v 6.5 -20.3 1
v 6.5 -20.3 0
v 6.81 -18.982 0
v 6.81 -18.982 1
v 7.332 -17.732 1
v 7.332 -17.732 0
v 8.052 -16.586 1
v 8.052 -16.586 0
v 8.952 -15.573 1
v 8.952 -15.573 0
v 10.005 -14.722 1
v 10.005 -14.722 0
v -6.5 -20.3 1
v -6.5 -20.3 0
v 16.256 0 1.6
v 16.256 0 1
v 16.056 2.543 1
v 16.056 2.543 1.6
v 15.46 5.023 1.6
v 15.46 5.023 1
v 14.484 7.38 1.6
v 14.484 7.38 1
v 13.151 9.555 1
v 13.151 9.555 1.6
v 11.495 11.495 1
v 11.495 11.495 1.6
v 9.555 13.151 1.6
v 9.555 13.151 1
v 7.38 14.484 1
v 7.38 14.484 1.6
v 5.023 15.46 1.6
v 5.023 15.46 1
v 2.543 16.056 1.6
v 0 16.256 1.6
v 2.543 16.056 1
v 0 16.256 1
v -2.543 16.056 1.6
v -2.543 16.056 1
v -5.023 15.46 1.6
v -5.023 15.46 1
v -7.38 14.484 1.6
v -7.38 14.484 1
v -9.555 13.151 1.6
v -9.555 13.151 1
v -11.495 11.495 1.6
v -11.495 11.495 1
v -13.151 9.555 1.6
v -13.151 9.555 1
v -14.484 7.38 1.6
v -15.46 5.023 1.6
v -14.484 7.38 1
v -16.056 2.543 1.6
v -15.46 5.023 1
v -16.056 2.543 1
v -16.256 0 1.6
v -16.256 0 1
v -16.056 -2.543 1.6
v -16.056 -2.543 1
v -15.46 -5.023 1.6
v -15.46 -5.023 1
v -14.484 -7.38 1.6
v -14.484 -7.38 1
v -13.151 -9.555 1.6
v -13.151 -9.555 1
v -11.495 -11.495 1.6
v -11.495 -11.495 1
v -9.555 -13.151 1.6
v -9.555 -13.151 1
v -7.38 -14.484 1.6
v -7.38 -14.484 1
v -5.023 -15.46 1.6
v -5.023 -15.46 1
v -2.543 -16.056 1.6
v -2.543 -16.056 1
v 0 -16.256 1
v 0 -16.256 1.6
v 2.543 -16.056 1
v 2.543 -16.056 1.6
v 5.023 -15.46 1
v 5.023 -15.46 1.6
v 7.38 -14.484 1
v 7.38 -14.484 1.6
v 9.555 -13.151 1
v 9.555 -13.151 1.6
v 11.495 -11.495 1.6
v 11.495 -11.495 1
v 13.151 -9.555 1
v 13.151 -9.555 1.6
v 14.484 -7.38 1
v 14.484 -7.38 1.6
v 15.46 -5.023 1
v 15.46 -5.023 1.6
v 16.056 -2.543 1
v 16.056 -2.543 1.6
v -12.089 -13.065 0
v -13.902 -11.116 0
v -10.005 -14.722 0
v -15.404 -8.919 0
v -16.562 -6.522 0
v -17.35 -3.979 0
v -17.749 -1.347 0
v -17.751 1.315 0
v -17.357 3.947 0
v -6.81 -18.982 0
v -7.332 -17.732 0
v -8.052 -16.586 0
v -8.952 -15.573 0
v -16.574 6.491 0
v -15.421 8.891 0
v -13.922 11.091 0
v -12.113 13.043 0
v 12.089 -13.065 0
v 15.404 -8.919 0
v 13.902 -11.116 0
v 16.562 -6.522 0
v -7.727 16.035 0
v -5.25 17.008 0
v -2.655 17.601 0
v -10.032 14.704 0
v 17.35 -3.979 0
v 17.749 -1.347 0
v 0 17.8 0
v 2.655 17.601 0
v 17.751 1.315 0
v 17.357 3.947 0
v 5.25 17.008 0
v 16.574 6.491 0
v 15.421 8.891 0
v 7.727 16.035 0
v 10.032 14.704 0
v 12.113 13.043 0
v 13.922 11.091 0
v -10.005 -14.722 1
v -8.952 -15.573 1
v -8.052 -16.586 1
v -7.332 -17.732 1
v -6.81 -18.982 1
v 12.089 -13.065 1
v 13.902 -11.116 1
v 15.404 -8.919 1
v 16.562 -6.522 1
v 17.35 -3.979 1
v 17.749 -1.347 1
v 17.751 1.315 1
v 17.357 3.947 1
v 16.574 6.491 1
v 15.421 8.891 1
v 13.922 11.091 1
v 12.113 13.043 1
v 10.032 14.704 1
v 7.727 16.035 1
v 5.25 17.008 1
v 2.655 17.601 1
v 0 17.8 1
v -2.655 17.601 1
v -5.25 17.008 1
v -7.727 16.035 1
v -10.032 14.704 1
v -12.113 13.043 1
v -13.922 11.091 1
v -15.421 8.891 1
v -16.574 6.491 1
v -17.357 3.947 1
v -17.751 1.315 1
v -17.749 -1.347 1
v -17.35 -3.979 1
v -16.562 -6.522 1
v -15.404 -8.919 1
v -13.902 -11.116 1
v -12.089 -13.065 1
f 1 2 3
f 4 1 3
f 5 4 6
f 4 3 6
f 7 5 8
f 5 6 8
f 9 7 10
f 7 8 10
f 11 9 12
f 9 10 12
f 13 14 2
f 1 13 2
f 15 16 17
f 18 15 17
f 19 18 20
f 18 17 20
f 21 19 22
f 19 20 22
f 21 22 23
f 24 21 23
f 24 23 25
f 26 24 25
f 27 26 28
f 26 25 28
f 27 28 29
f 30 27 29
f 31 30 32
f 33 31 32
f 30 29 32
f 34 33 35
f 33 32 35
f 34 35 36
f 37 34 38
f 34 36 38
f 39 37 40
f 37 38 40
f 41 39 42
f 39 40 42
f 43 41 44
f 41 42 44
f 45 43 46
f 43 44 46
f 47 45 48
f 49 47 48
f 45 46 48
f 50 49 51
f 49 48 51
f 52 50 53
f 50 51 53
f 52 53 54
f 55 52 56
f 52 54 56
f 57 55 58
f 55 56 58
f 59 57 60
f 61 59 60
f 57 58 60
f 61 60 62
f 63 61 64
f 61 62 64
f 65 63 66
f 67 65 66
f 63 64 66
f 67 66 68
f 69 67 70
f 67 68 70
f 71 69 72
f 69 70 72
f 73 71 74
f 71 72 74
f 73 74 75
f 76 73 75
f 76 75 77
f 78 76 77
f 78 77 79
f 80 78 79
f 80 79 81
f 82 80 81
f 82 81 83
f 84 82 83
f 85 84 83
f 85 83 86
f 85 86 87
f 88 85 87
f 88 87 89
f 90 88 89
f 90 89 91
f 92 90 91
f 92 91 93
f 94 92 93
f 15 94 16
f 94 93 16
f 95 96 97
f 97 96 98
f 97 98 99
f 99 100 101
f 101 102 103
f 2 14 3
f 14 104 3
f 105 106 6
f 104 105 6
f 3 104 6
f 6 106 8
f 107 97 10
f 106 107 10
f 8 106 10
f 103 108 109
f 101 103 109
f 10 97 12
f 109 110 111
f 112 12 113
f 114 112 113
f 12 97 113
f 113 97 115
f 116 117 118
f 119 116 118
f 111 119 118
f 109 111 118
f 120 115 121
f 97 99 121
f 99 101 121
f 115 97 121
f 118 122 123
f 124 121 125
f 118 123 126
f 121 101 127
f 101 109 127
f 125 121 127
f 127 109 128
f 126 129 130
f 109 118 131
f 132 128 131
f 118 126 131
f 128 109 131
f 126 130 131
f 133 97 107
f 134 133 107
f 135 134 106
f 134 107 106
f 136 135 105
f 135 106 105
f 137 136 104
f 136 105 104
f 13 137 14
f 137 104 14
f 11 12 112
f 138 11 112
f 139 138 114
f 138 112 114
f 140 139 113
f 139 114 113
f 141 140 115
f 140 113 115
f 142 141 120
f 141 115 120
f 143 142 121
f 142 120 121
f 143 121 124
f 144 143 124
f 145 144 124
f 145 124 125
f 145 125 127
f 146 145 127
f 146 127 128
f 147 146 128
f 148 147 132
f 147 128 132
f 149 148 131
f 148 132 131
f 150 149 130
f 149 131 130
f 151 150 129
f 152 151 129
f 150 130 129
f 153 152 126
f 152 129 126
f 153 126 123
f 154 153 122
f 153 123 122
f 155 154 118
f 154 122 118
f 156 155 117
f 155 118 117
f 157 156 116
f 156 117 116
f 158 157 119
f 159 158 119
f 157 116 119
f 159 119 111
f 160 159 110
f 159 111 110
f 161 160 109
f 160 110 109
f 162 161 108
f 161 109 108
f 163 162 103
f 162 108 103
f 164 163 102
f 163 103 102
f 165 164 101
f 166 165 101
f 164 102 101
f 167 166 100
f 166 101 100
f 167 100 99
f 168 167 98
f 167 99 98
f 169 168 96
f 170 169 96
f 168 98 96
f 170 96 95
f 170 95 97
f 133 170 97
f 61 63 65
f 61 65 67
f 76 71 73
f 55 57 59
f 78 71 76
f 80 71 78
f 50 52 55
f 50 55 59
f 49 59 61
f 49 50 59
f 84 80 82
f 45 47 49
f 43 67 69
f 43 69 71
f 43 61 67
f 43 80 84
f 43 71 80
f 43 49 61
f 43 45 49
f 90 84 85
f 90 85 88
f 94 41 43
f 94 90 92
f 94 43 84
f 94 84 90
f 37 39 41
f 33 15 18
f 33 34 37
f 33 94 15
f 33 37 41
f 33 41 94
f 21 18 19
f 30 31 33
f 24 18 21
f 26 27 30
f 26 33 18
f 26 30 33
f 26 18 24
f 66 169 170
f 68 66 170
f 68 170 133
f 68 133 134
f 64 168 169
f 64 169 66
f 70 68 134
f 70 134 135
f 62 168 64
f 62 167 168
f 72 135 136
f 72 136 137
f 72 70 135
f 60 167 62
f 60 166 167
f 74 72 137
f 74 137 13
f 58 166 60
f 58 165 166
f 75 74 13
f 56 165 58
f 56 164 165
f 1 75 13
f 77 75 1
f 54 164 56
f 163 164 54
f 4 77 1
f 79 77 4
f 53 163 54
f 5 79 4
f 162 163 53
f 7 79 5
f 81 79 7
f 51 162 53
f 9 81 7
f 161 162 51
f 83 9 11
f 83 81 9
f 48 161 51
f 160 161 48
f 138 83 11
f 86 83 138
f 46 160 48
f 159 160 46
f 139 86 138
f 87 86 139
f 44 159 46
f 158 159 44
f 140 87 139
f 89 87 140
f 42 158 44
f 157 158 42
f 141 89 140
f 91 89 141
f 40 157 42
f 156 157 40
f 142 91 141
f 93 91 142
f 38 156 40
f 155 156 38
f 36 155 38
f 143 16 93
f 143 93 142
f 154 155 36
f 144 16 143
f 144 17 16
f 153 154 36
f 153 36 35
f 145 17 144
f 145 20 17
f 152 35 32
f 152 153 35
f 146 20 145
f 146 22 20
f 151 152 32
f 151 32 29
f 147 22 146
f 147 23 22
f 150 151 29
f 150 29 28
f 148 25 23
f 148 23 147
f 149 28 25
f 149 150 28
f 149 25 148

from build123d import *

# Parameters (mm, degrees)
BOSS_EXTRU_1_CONTOUR_CRAN_DEPTH = 1
CRAN_R                          = 16.256
BOSS_EXTRU_1_CRAN_DEPTH         = 0.6


with BuildPart() as part:
    # Contour_Écran → Boss.-Extru.1_Contour_Écran (new body)
    with BuildSketch(Plane.XY):
        with BuildLine():
            Line((-6.5, -20.3), (6.5, -20.3))
            ThreePointArc((6.5, -20.3), (7.668481961, -17.144005216), (10.005084126, -14.722034222))
            ThreePointArc((10.005084126, -14.722034222), (0, 17.8), (-10.005084126, -14.722034222))
            ThreePointArc((-10.005084126, -14.722034222), (-7.668481961, -17.144005216), (-6.5, -20.3))
        make_face()
    extrude(amount=BOSS_EXTRU_1_CONTOUR_CRAN_DEPTH)

    # cran → Boss.-Extru.1_Écran (add)
    with BuildSketch(Plane.XY.offset(1)):
        Circle(CRAN_R)
    extrude(amount=BOSS_EXTRU_1_CRAN_DEPTH)


solid = part.part
